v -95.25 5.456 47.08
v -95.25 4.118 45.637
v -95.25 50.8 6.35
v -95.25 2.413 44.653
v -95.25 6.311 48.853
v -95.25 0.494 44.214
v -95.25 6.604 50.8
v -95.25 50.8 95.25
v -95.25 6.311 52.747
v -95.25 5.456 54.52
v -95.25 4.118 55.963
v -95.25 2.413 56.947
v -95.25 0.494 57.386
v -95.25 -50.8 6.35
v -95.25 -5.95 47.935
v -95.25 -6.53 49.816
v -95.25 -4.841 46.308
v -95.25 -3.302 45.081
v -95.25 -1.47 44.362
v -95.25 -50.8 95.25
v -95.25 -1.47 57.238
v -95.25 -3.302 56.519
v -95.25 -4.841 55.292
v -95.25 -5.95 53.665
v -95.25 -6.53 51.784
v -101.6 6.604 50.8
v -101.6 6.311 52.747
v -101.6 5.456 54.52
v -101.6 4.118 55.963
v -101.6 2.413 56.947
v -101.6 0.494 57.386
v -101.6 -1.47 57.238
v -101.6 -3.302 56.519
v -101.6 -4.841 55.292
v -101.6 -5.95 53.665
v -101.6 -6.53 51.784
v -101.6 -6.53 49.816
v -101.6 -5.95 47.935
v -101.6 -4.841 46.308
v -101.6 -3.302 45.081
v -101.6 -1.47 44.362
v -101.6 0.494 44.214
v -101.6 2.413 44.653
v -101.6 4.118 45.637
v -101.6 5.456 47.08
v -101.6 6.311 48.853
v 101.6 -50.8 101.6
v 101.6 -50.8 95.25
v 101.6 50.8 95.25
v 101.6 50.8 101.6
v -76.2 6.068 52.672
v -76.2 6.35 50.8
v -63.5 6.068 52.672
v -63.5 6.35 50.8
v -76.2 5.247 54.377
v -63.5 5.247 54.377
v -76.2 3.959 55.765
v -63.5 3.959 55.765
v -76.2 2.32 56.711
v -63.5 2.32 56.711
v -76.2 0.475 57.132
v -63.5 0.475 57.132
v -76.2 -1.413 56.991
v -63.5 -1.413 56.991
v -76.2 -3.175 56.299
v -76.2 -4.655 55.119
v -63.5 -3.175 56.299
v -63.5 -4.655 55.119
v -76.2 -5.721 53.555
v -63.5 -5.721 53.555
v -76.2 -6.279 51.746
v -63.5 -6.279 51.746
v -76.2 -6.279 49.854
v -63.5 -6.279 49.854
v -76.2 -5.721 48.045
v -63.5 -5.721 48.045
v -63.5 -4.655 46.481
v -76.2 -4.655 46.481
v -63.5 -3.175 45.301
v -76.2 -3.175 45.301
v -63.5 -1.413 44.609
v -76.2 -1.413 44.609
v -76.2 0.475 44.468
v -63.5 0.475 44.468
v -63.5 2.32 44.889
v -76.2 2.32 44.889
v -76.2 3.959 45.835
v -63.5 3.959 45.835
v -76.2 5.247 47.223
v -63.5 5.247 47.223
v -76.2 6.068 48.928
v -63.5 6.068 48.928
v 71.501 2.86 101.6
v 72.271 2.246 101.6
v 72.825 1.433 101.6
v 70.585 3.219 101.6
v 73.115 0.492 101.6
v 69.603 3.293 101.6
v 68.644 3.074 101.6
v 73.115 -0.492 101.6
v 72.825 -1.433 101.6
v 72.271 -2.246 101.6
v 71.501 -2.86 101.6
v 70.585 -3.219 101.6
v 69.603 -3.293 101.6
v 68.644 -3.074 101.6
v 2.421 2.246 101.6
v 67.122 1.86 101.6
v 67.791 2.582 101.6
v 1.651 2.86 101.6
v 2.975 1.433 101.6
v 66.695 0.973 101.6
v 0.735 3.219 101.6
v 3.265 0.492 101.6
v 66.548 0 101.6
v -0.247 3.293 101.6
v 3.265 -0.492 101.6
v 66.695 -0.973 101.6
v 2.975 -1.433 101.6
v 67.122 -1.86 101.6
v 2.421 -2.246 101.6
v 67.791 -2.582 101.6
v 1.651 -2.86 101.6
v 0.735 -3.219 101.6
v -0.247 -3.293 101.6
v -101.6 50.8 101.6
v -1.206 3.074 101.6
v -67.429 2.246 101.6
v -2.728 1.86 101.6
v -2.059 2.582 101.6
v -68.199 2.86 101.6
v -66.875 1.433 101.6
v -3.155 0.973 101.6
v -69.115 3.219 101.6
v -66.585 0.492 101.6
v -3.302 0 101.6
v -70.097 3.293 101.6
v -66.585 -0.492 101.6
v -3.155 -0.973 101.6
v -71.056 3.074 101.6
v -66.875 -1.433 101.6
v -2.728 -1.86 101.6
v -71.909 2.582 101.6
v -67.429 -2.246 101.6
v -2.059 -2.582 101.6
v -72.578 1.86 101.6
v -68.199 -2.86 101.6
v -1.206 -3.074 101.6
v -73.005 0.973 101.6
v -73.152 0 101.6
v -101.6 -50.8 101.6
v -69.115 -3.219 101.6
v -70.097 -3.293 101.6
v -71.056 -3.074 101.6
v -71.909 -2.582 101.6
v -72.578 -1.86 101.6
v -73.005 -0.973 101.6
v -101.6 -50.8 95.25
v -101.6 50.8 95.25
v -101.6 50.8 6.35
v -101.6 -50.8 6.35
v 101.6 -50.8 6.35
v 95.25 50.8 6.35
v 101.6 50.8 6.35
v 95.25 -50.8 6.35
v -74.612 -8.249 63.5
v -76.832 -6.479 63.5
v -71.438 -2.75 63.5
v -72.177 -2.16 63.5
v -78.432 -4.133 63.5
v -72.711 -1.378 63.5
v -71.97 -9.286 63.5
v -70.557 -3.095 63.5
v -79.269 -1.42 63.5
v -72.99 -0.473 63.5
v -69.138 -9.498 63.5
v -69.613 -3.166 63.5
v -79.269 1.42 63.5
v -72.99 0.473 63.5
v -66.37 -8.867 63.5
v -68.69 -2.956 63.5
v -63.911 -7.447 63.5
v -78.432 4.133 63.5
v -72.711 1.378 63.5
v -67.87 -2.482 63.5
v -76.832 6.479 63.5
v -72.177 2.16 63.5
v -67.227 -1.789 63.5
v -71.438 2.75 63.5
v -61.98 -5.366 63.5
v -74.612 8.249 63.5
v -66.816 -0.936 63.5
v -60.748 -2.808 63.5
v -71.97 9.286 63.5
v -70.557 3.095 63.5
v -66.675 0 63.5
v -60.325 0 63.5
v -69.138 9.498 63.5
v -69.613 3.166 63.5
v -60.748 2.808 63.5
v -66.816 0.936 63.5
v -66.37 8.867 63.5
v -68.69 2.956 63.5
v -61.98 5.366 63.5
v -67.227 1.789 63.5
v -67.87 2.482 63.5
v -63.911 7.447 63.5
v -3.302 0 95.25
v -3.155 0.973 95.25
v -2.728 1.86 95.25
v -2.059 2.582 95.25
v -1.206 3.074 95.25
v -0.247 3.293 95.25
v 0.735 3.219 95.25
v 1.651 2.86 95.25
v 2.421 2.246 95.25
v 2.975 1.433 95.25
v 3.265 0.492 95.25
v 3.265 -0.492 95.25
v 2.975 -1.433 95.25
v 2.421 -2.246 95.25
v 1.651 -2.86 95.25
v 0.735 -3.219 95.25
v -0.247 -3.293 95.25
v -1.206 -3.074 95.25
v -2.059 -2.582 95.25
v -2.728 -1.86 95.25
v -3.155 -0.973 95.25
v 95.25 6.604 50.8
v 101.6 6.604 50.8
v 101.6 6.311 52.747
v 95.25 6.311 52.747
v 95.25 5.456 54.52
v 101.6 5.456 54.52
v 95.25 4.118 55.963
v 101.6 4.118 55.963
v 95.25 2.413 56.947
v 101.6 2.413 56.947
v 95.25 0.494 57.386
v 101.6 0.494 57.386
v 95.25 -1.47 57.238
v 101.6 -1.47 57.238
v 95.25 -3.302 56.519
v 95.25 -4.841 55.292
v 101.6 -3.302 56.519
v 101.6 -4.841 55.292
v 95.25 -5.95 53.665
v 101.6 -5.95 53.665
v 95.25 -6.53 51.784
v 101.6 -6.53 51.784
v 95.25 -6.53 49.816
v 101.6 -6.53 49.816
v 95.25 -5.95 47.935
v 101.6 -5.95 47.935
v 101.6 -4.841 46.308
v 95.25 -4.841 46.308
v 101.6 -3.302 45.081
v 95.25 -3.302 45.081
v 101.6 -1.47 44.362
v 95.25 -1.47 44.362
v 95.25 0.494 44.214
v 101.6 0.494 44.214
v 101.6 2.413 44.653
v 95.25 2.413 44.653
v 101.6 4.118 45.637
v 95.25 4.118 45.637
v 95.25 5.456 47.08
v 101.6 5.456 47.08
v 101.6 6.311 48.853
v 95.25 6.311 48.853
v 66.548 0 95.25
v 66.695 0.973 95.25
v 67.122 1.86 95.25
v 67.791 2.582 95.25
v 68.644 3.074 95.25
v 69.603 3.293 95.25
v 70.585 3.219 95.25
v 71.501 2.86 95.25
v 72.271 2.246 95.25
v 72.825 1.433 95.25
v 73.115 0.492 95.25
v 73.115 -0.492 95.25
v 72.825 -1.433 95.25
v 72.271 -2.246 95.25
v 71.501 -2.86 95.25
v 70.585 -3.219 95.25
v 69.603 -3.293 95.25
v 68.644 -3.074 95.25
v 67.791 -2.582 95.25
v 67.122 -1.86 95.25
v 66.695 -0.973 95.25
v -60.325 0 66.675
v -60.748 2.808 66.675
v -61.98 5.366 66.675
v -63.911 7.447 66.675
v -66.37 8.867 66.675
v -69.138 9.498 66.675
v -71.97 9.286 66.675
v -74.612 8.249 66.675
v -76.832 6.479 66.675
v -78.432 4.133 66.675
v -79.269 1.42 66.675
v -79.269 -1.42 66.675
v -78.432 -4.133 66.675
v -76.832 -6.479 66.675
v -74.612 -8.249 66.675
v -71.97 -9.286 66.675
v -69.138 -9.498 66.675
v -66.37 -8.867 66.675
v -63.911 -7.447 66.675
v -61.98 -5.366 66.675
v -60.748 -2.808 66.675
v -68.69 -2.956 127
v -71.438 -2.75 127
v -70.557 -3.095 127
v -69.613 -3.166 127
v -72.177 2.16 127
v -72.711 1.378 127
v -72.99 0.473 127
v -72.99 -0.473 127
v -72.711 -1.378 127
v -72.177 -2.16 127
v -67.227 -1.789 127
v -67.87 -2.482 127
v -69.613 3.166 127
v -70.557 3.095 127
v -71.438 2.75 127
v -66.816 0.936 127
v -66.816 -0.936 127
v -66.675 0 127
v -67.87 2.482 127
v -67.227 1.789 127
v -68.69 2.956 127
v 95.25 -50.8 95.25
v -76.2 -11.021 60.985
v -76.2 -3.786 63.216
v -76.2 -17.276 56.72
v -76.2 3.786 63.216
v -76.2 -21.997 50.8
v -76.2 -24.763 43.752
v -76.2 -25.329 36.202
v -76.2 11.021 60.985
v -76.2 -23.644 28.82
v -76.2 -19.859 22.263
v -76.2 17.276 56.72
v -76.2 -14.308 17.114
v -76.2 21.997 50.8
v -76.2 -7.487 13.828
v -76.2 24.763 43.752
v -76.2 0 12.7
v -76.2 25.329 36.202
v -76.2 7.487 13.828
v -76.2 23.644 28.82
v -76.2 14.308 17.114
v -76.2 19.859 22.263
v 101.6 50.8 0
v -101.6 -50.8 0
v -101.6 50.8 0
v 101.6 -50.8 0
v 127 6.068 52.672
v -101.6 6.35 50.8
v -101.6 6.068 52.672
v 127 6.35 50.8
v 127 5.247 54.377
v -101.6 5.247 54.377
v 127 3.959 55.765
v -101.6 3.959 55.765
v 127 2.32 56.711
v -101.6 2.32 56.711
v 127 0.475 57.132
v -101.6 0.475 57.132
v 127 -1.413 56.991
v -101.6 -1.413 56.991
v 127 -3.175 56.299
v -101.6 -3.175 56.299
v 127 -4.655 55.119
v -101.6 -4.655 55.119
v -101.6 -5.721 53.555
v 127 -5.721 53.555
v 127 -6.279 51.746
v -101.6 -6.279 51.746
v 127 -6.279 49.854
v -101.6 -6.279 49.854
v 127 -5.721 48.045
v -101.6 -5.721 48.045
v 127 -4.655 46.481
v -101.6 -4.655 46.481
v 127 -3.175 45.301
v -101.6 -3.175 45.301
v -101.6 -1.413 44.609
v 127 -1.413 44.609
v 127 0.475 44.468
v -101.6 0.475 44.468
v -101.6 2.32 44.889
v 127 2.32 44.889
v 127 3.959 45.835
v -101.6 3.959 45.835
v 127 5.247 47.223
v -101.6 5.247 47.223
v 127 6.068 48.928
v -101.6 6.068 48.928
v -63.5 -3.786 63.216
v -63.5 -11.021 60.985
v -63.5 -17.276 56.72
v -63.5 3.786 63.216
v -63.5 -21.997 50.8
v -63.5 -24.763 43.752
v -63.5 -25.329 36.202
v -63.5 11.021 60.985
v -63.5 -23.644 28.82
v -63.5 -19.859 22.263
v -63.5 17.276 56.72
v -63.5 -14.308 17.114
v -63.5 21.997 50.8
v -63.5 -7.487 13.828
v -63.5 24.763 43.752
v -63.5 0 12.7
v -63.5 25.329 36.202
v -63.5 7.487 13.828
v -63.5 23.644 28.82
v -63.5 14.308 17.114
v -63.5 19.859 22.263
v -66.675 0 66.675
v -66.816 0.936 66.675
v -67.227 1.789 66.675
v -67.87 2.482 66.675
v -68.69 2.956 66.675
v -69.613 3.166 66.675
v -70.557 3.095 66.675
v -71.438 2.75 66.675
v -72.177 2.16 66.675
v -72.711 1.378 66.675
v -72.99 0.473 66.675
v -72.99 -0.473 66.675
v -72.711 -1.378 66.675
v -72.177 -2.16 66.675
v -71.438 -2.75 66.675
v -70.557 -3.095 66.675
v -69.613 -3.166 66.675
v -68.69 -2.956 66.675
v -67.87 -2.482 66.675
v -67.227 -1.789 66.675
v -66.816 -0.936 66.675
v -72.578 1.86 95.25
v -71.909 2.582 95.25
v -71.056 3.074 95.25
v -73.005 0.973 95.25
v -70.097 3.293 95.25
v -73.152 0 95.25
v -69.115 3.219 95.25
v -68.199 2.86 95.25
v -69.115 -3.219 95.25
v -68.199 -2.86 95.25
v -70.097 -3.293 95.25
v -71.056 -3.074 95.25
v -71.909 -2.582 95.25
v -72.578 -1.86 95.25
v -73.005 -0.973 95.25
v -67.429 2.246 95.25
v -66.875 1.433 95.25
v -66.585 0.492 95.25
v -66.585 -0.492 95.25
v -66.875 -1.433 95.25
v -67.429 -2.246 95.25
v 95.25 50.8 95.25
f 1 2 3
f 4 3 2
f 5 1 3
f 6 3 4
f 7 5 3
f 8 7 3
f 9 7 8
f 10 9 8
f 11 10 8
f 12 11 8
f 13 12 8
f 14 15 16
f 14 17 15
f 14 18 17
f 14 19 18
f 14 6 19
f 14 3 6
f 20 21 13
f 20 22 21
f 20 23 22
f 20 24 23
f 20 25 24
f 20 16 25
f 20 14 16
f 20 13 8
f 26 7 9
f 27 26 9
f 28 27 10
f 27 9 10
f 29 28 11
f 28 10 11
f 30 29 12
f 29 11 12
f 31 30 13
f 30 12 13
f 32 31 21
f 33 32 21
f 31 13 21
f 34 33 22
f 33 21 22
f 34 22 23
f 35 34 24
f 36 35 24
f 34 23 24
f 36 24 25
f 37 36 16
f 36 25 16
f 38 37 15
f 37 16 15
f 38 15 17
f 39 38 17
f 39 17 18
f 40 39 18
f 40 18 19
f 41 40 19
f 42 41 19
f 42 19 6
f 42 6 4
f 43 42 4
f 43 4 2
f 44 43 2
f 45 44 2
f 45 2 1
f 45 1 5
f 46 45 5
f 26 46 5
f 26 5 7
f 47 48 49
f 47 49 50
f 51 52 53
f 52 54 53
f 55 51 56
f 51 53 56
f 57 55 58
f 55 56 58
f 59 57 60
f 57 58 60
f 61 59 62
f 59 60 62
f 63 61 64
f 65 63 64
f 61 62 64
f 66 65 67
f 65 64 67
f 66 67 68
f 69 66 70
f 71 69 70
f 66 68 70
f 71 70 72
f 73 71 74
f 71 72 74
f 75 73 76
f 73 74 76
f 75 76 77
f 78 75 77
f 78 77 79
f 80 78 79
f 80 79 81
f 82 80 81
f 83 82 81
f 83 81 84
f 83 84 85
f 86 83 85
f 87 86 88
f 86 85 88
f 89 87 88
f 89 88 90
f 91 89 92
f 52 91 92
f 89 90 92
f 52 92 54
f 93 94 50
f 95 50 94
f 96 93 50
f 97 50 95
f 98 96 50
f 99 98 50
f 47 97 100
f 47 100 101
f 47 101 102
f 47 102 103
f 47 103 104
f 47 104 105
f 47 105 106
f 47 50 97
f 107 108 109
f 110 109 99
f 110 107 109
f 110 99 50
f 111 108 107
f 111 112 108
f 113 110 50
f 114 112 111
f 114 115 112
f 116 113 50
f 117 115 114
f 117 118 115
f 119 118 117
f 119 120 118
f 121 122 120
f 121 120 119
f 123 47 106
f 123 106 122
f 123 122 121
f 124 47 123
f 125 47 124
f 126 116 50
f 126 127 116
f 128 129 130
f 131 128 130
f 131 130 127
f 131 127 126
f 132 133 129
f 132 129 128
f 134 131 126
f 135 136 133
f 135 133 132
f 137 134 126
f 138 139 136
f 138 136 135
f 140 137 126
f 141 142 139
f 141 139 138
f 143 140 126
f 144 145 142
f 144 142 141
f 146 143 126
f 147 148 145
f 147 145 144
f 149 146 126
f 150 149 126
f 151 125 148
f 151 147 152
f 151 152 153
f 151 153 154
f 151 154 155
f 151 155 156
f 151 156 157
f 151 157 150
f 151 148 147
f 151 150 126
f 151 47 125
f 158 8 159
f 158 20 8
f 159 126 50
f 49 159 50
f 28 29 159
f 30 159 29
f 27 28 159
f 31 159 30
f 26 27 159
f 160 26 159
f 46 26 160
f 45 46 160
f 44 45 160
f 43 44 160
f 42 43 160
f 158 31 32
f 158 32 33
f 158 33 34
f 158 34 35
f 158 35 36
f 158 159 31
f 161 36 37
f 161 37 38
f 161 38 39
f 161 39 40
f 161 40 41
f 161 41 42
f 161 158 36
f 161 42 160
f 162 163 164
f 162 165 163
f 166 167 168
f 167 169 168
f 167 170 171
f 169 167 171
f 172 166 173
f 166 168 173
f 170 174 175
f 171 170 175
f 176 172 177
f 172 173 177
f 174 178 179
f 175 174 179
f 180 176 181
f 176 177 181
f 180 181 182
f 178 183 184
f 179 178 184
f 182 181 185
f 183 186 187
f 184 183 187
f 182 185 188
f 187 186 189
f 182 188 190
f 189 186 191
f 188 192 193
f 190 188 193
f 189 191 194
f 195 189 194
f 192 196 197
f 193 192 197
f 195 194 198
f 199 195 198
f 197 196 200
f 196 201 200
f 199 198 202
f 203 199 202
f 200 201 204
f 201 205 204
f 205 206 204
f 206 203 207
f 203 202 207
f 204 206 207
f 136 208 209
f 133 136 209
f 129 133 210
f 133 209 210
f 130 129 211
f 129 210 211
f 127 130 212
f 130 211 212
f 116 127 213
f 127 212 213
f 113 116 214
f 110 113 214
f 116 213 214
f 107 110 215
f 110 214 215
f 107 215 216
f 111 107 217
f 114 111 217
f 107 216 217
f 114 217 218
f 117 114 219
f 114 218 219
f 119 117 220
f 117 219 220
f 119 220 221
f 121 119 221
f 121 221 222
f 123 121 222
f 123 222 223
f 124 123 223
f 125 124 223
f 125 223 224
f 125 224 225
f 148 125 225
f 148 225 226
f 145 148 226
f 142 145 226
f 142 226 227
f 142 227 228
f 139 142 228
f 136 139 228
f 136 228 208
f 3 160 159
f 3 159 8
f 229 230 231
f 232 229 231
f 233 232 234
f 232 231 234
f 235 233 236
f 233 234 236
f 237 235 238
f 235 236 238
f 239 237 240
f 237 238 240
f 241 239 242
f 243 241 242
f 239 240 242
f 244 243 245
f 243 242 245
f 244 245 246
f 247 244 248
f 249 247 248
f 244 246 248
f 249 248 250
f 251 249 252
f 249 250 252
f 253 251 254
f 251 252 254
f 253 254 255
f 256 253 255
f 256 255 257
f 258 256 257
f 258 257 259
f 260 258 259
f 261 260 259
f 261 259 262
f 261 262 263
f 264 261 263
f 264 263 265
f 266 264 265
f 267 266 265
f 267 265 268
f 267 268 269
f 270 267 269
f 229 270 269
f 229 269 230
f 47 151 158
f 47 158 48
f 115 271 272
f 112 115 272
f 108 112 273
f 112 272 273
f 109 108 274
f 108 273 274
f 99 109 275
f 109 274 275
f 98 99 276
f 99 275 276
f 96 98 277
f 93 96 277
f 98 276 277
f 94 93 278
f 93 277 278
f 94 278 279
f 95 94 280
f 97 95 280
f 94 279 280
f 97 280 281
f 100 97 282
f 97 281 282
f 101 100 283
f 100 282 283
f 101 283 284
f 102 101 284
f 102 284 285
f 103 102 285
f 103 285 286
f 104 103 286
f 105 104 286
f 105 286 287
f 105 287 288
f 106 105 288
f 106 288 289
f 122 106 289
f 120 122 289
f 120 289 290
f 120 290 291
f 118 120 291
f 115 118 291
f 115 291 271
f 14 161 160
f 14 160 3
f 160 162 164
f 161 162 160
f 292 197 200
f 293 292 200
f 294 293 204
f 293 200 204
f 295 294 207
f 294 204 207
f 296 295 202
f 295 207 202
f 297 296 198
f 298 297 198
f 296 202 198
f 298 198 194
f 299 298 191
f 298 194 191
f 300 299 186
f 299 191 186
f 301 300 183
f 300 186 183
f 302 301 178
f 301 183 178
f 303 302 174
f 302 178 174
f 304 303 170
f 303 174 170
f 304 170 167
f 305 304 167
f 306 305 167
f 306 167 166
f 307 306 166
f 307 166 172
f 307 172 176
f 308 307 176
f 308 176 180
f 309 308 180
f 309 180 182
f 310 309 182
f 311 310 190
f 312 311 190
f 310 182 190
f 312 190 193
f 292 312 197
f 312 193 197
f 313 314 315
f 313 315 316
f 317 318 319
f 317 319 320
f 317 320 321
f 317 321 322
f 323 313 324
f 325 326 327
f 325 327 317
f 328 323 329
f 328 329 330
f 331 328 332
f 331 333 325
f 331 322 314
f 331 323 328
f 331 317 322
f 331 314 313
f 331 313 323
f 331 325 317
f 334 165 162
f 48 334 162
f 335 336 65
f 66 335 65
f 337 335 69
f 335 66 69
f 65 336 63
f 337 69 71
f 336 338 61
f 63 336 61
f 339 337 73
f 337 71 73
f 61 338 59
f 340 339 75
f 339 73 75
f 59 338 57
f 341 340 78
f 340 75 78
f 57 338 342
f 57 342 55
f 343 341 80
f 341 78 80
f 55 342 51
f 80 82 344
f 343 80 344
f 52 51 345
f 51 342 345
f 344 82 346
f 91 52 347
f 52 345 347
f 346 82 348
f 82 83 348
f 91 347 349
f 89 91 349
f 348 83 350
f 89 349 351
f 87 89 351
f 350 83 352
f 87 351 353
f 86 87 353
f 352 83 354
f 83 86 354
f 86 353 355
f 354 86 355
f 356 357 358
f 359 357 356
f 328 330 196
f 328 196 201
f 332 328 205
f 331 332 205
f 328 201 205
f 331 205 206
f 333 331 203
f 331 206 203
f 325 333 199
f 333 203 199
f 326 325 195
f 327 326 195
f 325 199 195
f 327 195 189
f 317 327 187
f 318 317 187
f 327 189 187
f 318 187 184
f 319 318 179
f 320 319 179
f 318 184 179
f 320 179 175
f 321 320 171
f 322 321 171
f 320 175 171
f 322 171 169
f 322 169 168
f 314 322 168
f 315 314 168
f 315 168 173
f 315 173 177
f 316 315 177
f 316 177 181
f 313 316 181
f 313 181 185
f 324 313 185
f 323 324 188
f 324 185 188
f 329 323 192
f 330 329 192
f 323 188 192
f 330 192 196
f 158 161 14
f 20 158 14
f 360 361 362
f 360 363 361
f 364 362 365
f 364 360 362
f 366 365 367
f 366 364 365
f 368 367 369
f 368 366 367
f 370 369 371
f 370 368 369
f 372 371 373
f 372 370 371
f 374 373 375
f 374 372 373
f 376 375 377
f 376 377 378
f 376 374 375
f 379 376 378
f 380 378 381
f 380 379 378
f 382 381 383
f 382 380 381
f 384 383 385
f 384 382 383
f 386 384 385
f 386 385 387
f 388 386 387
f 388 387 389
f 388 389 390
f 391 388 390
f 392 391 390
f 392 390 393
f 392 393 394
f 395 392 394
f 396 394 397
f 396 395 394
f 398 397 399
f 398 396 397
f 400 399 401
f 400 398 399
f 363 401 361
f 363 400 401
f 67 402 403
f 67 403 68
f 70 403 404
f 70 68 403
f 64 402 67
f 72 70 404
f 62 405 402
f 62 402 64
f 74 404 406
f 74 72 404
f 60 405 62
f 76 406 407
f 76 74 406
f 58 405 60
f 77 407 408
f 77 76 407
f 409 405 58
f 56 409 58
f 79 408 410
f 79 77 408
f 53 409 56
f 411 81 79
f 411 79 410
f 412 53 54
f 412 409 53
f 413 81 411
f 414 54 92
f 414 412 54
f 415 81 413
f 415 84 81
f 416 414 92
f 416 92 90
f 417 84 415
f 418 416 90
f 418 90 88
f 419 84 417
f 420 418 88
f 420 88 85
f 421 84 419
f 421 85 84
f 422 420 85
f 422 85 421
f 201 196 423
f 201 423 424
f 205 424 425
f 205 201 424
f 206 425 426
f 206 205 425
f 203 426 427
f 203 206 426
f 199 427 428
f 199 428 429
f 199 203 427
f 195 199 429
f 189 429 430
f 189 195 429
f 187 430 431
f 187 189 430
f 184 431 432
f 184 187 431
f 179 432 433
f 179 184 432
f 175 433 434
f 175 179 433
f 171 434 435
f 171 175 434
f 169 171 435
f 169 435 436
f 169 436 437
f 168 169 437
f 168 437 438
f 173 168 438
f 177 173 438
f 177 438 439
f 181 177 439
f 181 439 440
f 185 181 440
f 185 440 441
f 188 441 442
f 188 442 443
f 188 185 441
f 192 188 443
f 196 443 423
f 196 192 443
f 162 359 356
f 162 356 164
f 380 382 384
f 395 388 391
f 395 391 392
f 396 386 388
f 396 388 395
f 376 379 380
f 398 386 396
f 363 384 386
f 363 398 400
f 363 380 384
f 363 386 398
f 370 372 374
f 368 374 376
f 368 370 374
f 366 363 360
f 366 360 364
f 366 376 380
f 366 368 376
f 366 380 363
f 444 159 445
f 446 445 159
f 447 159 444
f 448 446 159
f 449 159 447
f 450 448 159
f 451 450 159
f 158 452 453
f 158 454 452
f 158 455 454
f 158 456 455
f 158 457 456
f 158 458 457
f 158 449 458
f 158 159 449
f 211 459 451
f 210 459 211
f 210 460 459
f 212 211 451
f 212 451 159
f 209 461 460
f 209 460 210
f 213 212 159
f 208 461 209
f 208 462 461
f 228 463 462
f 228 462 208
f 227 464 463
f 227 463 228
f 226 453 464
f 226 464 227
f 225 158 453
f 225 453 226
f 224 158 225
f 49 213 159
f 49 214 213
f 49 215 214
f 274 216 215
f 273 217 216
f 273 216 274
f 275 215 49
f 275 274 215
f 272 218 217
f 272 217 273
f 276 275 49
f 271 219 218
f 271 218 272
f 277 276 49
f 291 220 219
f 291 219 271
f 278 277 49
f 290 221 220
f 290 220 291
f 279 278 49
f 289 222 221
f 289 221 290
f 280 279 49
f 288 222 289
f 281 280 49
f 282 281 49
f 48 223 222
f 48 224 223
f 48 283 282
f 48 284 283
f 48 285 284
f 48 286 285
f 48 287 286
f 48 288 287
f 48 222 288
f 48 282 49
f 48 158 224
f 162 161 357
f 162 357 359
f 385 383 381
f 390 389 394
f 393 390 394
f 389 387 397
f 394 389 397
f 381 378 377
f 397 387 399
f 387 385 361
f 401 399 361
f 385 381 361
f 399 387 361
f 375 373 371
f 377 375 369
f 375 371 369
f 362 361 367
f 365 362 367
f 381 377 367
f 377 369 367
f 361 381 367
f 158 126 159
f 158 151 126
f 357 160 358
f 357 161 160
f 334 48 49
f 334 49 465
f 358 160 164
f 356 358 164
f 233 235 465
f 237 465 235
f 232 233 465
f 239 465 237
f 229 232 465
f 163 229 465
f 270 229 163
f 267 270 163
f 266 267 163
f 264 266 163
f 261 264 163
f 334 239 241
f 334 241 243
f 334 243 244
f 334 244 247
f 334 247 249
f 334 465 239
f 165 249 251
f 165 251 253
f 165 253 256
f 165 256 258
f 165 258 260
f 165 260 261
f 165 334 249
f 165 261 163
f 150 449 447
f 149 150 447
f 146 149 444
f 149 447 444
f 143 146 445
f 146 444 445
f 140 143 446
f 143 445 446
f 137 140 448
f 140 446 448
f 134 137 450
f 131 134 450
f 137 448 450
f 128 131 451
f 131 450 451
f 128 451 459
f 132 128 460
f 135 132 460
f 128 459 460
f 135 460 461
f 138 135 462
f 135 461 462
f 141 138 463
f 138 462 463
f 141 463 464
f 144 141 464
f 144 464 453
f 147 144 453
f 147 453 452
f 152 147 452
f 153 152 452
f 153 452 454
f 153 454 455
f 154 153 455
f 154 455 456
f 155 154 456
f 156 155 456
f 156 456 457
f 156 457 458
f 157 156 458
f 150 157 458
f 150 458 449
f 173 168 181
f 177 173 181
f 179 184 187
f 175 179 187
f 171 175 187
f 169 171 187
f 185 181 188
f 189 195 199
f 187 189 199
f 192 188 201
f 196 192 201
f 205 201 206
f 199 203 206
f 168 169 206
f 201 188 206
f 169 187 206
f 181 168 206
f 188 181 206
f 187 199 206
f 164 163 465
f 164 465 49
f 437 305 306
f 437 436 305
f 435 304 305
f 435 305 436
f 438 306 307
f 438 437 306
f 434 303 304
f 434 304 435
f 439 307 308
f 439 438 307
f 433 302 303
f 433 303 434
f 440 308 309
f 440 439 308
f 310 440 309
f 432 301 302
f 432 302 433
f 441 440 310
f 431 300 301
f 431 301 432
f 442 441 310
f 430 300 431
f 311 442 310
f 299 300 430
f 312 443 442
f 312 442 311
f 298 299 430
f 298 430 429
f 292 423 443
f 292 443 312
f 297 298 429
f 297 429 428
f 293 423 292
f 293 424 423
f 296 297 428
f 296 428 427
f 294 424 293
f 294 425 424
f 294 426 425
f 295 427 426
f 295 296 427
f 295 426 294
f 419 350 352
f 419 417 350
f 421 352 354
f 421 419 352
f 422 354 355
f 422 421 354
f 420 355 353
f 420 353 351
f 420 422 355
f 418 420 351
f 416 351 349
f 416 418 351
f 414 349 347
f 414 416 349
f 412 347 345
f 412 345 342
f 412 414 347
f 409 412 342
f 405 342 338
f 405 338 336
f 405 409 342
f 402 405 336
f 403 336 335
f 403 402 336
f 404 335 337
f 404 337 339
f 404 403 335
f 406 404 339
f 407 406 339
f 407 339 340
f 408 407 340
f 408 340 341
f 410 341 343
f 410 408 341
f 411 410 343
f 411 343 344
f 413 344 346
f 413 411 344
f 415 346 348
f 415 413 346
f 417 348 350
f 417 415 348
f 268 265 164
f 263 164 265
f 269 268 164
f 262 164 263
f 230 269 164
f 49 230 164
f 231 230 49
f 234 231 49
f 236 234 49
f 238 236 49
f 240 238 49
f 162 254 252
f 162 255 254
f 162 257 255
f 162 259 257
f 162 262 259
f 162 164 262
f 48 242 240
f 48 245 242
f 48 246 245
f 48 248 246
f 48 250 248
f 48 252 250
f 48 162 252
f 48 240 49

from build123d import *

# Parameters (mm, degrees)
F1_DEPTH      = 50.8
F2_DEPTH      = 50.8
F2_DEPTH_BACK = 50.8
F3_R          = 6.604
F3_R_2        = 6.35
F4_DEPTH      = 203.201
F5_DEPTH      = 25.4
F5_DEPTH_BACK = 203.2
F0_W          = 12.7
F0_H          = 25.4
F9_D          = 6.604
F11_R         = 3.175
F12_DEPTH     = 63.5
F11_R_2       = 9.525
F13_DEPTH     = 3.175


with BuildPart() as f1:
    # F0 (on Front) → F1 (new body, symmetric)
    with BuildSketch(Plane.XZ):
        Polygon((-95.25, 6.35), (-101.6, 6.35), (-101.6, 0), (101.6, 0), (101.6, 6.35), (95.25, 6.35), align=None)
    extrude(amount=F1_DEPTH, both=True)


with BuildPart() as f1b:
    # F0 (on Front) → F1, piece 2 (new body, symmetric)
    with BuildSketch(Plane.XZ):
        Polygon((-101.6, 101.6), (-101.6, 95.25), (-95.25, 95.25), (95.25, 95.25), (101.6, 95.25), (101.6, 101.6), align=None)
    extrude(amount=F1_DEPTH, both=True)

    # F9 (through all)
    with Locations(Plane.XY.offset(101.6)):
        with Locations((-69.85, 0), (69.85, 0), (0, 0)):
            Hole(F9_D / 2)


with BuildPart() as f2:
    # F0 (on Front) → F2 (new body, two sides)
    with BuildSketch(Plane.XZ) as f2_sk:
        Polygon((-101.6, 95.25), (-101.6, 6.35), (-95.25, 6.35), (-95.25, 50.8), (-95.25, 95.25), align=None)
    extrude(amount=F2_DEPTH)
    extrude(f2_sk.sketch, amount=-F2_DEPTH_BACK)


with BuildPart() as f2b:
    # F0 (on Front) → F2, piece 2 (new body, two sides)
    with BuildSketch(Plane.XZ) as f2_2_sk:
        Polygon((95.25, 50.8), (95.25, 6.35), (101.6, 6.35), (101.6, 95.25), (95.25, 95.25), align=None)
    extrude(amount=F2_DEPTH)
    extrude(f2_2_sk.sketch, amount=-F2_DEPTH_BACK)


with BuildPart() as f4_tool:
    # F3 (on face) → F4 (new body, through all)
    with BuildSketch(Plane.YZ.offset(101.6)):
        with Locations((0, 50.8)):
            Circle(F3_R)
        with Locations((0, 50.8)):
            Circle(F3_R_2, mode=Mode.SUBTRACT)
        with Locations((0, 50.8)):
            Circle(F3_R_2)
    extrude(amount=-F4_DEPTH)


with BuildPart() as f2_1:
    add(f2.part)

    # F4: cut by f4_tool
    add(f4_tool.part, mode=Mode.SUBTRACT)


with BuildPart() as f2b_1:
    add(f2b.part)

    # F4: cut by f4_tool
    add(f4_tool.part, mode=Mode.SUBTRACT)


with BuildPart() as f5:
    # F3 (on face) → F5 (new body, two sides)
    with BuildSketch(Plane.YZ.offset(101.6)) as f5_sk:
        with Locations((0, 50.8)):
            Circle(F3_R_2)
    extrude(amount=F5_DEPTH)
    extrude(f5_sk.sketch, amount=-F5_DEPTH_BACK)


with BuildPart() as f6:
    # F0 (on Front) → F6 (revolve)
    with BuildSketch(Plane.XZ):
        with Locations((-69.85, 25.4)):
            Rectangle(F0_W, F0_H)
    revolve(axis=Axis((-69.85, 0, 38.1), (1, 0, 0)))

    # F7: cut F5
    add(f5.part, mode=Mode.SUBTRACT)


with BuildPart() as f12:
    # F11 (on plane+point) → F12 (new body, through all)
    with BuildSketch(Plane.XY.offset(63.5)):
        with Locations((-69.85, 0)):
            Circle(F11_R)
    extrude(amount=F12_DEPTH)


with BuildPart() as f13:
    # F11 (on plane+point) → F13 (new body)
    with BuildSketch(Plane.XY.offset(63.5)):
        with Locations((-69.85, 0)):
            Circle(F11_R_2)
        with Locations((-69.85, 0)):
            Circle(F11_R, mode=Mode.SUBTRACT)
    extrude(amount=F13_DEPTH)


solid = Compound([f1.part, f1b.part, f2_1.part, f2b_1.part, f5.part, f6.part, f12.part, f13.part])
